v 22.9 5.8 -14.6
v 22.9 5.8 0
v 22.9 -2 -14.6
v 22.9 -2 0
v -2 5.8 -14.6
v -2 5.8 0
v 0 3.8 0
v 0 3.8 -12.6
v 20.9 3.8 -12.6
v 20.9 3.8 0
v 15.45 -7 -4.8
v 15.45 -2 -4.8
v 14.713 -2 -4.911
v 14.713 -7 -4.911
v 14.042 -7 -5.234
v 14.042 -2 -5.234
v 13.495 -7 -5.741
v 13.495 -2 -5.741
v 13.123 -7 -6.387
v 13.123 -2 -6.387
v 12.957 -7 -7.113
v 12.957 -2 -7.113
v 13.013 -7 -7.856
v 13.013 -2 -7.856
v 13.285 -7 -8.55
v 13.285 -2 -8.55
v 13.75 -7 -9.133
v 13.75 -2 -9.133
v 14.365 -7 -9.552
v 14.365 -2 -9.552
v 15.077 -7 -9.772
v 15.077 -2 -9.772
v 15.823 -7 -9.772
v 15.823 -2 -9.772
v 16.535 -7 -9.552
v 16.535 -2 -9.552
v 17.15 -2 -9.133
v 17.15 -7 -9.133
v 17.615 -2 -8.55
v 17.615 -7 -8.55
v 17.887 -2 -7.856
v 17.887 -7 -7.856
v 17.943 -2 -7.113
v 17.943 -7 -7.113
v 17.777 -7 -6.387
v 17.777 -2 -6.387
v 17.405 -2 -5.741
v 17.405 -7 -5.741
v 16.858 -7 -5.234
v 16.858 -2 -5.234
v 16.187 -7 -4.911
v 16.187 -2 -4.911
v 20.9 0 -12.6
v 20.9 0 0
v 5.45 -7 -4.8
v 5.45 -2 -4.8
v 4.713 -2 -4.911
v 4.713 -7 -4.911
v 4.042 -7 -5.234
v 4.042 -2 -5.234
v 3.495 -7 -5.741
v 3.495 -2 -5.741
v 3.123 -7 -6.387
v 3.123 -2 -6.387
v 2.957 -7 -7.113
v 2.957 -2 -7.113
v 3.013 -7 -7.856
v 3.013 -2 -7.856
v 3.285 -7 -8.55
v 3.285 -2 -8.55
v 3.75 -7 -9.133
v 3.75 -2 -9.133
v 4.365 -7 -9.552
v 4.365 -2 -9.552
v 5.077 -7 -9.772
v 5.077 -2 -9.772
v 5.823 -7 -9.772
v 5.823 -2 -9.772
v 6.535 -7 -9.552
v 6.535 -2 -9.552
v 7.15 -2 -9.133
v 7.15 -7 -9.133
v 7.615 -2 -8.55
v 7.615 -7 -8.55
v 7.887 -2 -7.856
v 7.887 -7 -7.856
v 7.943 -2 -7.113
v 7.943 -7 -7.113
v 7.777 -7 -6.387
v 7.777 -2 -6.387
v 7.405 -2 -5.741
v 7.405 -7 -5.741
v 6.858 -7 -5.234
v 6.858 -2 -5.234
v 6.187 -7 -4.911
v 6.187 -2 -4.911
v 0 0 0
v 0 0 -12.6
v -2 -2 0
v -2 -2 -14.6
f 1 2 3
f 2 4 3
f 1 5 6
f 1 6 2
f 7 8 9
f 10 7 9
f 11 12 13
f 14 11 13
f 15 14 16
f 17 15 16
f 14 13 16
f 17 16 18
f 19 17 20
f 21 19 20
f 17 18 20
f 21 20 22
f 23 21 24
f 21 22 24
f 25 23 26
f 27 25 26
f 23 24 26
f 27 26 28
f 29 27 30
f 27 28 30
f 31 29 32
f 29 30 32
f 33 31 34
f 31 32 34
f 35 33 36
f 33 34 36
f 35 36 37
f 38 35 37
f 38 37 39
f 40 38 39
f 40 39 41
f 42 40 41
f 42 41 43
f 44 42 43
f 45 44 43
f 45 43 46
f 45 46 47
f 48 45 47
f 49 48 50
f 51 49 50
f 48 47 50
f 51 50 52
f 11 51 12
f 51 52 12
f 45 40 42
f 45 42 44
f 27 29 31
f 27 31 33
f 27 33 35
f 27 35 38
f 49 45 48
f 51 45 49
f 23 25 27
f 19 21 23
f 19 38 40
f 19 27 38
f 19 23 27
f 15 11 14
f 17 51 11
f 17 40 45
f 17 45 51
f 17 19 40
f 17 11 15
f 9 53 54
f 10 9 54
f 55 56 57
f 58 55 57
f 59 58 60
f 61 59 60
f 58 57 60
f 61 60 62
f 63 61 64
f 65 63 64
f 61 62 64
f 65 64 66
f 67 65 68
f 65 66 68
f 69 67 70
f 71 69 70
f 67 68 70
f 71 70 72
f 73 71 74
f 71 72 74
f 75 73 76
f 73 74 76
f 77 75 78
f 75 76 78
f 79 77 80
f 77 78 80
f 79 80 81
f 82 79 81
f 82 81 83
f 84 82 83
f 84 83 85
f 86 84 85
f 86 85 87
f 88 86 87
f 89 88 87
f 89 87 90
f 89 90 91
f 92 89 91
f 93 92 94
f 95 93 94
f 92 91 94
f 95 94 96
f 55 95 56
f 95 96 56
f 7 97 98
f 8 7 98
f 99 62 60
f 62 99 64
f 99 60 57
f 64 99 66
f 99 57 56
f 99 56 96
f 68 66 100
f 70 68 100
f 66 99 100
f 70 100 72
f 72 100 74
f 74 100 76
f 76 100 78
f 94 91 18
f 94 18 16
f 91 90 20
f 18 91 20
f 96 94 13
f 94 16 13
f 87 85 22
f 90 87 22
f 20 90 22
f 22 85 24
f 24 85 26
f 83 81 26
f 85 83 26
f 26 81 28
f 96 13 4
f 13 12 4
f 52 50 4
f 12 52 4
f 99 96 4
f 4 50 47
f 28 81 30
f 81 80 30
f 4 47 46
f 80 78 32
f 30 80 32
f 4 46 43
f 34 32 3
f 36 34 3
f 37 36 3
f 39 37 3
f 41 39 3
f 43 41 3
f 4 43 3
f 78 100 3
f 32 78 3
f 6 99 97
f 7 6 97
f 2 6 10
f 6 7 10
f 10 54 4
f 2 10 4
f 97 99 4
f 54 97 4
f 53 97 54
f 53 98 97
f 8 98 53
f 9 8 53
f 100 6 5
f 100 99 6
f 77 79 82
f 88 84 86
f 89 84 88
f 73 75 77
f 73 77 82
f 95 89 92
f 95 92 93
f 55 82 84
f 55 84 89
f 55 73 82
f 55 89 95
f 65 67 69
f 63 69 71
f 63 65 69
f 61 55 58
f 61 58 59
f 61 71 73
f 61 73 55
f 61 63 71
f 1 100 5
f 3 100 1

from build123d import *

# Parameters (mm, degrees)
BOSS_EXTRUDE1_DEPTH = 3.8
SKETCH1_3_W         = 24.9
SKETCH1_3_H         = 14.6
BOSS_EXTRUDE2_DEPTH = 2
SKETCH3_R           = 2.5
BOSS_EXTRUDE4_DEPTH = 5
SKETCH4_W           = 24.9
SKETCH4_H           = 14.6
BOSS_EXTRUDE5_DEPTH = 2


with BuildPart() as part:
    # Sketch1 → Boss-Extrude1 (new body)
    with BuildSketch(Plane(origin=(0, 0, 0), x_dir=(1, 0, 0), z_dir=(0, 1, 0))):
        Polygon((22.9, 14.6), (-2, 14.6), (-2, 0), (0, 0), (0, 12.6), (20.9, 12.6), (20.9, 0), (22.9, 0), align=None)
    extrude(amount=BOSS_EXTRUDE1_DEPTH)

    # Sketch1<3> → Boss-Extrude2 (add)
    with BuildSketch(Plane(origin=(0, 0, 0), x_dir=(1, 0, 0), z_dir=(0, 1, 0))):
        with Locations((10.45, 7.3)):
            Rectangle(SKETCH1_3_W, SKETCH1_3_H)
    extrude(amount=-BOSS_EXTRUDE2_DEPTH)

    # Sketch3 → Boss-Extrude4 (add)
    with BuildSketch(Plane.XZ.offset(2)):
        with Locations((5.45, -7.3)):
            Circle(SKETCH3_R)
        with Locations((15.45, -7.3)):
            Circle(SKETCH3_R)
    extrude(amount=BOSS_EXTRUDE4_DEPTH)

    # Sketch4 → Boss-Extrude5 (add)
    with BuildSketch(Plane(origin=(0, 3.8, 0), x_dir=(1, 0, 0), z_dir=(0, 1, 0))):
        with Locations((10.45, 7.3)):
            Rectangle(SKETCH4_W, SKETCH4_H)
    extrude(amount=BOSS_EXTRUDE5_DEPTH)


solid = part.part
